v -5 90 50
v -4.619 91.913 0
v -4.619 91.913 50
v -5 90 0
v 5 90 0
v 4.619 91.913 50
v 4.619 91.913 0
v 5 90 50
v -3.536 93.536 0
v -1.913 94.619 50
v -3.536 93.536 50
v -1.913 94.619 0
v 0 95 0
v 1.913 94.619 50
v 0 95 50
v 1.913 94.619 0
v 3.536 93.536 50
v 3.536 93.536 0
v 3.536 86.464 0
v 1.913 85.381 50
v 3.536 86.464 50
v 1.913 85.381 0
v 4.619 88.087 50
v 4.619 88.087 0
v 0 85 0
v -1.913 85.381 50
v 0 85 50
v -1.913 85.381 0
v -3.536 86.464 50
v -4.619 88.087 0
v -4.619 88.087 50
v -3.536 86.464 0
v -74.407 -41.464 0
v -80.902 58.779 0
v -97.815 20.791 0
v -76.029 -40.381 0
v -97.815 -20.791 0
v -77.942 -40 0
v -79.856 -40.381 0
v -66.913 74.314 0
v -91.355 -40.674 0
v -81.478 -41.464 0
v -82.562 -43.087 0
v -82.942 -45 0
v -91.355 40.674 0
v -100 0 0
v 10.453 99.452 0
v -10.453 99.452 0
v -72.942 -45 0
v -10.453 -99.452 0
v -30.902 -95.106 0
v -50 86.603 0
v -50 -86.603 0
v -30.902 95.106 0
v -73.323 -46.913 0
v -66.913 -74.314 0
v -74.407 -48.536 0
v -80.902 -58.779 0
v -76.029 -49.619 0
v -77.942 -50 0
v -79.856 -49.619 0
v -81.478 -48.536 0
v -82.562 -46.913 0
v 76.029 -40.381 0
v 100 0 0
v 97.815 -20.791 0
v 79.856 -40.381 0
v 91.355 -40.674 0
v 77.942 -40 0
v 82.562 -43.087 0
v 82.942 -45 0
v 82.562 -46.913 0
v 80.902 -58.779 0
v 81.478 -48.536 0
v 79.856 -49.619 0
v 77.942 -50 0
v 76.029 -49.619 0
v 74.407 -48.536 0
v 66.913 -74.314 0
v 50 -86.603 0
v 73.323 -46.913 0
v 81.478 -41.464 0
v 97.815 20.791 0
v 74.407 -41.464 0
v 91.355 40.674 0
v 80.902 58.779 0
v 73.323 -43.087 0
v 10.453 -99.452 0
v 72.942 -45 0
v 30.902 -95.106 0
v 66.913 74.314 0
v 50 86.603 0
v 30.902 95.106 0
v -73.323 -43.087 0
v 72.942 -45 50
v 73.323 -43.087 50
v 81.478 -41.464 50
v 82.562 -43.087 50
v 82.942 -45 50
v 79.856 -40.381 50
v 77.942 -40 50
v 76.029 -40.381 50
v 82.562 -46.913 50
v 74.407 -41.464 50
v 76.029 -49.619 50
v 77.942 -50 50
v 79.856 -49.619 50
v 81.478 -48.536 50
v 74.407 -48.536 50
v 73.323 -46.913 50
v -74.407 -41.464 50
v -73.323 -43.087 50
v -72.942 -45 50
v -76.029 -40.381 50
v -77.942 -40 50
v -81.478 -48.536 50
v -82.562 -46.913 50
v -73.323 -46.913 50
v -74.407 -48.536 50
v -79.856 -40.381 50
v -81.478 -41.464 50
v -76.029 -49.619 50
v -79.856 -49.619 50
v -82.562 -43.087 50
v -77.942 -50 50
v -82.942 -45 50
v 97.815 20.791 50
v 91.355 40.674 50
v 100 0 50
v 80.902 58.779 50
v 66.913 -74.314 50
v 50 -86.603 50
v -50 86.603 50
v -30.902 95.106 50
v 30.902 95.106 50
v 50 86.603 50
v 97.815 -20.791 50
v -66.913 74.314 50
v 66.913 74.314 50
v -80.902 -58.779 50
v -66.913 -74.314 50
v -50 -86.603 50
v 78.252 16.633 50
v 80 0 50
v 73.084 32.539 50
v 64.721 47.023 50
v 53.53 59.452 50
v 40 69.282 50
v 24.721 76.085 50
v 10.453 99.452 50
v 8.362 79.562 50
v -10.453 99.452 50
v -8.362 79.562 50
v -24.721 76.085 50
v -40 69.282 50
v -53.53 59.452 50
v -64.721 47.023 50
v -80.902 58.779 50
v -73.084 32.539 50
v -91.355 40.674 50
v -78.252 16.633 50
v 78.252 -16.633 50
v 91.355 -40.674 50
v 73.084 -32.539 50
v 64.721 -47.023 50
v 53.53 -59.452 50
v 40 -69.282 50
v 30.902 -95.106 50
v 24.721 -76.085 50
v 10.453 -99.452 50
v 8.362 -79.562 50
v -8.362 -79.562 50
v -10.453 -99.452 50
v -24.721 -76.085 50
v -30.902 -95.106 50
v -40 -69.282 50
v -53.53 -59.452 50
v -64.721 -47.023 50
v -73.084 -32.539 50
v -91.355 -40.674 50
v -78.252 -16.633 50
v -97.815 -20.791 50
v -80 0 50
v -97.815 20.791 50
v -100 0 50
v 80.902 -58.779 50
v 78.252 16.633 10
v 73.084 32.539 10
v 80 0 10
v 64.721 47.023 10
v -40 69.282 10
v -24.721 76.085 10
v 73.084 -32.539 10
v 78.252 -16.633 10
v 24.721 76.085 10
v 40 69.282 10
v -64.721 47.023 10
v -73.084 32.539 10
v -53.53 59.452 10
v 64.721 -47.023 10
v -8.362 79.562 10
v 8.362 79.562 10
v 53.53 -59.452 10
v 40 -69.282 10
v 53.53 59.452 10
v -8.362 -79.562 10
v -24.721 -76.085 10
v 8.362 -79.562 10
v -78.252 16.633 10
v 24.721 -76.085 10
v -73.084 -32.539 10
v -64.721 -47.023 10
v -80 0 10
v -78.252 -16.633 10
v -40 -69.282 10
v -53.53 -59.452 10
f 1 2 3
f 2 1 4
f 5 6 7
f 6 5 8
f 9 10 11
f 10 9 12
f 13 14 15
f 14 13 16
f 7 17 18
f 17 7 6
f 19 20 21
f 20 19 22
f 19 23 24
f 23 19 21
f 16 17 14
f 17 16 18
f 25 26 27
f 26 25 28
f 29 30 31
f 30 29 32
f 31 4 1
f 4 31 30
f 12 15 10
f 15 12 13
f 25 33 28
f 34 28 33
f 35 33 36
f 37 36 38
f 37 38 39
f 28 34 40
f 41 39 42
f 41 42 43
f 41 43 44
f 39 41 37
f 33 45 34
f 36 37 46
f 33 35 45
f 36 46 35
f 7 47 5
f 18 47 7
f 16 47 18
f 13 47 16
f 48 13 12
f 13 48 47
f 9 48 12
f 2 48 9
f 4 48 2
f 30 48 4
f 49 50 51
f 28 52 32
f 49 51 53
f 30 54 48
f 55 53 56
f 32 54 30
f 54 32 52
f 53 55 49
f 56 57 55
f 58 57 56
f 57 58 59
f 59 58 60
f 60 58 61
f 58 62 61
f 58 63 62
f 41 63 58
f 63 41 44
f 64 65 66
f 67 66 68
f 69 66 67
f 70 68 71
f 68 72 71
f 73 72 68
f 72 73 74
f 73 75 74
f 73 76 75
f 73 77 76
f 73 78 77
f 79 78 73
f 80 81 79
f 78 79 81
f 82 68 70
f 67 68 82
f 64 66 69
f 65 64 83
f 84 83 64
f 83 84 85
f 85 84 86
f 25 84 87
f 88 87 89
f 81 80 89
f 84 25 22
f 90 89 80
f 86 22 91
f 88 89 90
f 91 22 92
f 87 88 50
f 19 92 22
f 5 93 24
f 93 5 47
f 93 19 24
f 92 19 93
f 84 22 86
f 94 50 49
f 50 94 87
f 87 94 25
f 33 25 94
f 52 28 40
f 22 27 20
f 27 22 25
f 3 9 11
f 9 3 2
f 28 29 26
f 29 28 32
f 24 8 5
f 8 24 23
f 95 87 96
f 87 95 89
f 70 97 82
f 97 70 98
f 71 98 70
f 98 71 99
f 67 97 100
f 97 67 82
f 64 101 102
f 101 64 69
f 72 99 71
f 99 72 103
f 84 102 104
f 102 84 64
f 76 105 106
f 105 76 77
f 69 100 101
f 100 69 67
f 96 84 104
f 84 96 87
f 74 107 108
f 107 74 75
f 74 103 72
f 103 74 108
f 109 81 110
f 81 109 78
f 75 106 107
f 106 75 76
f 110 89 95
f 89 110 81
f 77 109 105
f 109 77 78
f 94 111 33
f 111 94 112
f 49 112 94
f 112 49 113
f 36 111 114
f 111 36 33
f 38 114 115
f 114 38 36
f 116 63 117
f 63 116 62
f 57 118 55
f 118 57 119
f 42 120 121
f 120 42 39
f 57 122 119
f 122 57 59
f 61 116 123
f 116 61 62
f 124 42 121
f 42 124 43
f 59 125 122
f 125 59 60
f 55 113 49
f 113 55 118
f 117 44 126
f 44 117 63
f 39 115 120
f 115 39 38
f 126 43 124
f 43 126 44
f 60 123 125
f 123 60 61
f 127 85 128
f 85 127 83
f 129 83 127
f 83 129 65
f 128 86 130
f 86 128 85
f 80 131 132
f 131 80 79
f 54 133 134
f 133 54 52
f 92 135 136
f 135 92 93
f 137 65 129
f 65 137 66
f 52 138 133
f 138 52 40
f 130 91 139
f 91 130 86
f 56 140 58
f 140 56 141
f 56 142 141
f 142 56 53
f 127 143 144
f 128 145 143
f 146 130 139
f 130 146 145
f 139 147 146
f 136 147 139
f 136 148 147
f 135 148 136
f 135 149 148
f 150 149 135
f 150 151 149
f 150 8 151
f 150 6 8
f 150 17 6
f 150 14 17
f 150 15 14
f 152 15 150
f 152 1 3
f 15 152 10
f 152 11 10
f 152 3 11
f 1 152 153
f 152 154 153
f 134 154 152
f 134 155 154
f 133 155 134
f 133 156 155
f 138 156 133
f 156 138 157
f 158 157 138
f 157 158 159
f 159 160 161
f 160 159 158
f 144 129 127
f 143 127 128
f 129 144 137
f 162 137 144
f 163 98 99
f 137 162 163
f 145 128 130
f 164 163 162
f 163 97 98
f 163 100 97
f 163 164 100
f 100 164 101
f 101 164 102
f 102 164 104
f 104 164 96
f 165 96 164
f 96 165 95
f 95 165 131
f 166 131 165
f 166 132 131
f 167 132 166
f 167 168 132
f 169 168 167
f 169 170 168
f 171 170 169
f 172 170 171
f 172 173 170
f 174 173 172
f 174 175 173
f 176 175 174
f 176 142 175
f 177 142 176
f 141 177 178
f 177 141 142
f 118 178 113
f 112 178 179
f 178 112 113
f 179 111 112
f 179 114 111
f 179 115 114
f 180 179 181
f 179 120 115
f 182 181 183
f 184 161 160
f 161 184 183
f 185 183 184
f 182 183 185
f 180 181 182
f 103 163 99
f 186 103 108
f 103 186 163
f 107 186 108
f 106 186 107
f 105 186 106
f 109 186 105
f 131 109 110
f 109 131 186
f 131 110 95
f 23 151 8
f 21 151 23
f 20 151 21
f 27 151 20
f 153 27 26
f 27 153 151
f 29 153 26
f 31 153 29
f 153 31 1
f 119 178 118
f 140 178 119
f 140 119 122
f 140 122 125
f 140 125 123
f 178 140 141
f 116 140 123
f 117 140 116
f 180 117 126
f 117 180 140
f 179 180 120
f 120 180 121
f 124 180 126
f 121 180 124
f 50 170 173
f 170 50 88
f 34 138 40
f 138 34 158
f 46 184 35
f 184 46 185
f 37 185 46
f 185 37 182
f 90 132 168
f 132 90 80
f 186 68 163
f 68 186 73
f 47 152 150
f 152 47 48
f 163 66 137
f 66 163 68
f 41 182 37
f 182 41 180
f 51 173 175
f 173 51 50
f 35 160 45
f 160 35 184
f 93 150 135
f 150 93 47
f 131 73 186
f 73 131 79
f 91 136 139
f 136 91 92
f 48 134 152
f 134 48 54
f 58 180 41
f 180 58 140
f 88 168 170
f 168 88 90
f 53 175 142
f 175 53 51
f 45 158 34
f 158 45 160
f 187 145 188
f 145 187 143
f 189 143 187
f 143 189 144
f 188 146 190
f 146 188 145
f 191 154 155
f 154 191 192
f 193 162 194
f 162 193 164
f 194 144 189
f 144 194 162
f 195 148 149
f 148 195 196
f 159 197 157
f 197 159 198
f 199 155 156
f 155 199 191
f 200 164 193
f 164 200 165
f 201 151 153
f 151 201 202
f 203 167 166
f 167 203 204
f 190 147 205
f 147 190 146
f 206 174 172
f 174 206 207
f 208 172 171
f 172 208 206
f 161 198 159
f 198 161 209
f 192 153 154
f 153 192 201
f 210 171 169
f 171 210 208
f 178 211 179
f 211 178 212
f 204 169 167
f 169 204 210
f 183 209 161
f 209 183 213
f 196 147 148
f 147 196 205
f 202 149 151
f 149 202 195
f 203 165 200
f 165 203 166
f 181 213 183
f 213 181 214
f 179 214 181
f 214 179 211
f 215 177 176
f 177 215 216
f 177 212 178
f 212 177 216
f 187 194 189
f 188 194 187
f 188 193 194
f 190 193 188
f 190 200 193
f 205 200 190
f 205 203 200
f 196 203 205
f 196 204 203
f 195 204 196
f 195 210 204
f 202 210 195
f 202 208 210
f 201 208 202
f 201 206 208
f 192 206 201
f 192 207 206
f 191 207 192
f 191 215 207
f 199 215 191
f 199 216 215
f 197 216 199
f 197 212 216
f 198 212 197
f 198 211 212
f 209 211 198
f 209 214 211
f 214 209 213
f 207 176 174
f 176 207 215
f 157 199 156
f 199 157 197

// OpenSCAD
module example005()
{
  translate([0, 0, 0]) {
      
    difference() {
      cylinder(h = 50, r = 100);
      translate([0, 0, 10]) cylinder(h = 50, r = 80);
      
      
      for (i = [0:3]) {
        echo(360*i/3, sin(360*i/3)*80, cos(360*i/3)*80);      
        translate([sin(360*i/3)*90, cos(360*i/3)*90, 0 ])
        cylinder(h = 200, r=5);
        }
    
    }
    
    
    
  }
}

echo(version=version());

example005();
